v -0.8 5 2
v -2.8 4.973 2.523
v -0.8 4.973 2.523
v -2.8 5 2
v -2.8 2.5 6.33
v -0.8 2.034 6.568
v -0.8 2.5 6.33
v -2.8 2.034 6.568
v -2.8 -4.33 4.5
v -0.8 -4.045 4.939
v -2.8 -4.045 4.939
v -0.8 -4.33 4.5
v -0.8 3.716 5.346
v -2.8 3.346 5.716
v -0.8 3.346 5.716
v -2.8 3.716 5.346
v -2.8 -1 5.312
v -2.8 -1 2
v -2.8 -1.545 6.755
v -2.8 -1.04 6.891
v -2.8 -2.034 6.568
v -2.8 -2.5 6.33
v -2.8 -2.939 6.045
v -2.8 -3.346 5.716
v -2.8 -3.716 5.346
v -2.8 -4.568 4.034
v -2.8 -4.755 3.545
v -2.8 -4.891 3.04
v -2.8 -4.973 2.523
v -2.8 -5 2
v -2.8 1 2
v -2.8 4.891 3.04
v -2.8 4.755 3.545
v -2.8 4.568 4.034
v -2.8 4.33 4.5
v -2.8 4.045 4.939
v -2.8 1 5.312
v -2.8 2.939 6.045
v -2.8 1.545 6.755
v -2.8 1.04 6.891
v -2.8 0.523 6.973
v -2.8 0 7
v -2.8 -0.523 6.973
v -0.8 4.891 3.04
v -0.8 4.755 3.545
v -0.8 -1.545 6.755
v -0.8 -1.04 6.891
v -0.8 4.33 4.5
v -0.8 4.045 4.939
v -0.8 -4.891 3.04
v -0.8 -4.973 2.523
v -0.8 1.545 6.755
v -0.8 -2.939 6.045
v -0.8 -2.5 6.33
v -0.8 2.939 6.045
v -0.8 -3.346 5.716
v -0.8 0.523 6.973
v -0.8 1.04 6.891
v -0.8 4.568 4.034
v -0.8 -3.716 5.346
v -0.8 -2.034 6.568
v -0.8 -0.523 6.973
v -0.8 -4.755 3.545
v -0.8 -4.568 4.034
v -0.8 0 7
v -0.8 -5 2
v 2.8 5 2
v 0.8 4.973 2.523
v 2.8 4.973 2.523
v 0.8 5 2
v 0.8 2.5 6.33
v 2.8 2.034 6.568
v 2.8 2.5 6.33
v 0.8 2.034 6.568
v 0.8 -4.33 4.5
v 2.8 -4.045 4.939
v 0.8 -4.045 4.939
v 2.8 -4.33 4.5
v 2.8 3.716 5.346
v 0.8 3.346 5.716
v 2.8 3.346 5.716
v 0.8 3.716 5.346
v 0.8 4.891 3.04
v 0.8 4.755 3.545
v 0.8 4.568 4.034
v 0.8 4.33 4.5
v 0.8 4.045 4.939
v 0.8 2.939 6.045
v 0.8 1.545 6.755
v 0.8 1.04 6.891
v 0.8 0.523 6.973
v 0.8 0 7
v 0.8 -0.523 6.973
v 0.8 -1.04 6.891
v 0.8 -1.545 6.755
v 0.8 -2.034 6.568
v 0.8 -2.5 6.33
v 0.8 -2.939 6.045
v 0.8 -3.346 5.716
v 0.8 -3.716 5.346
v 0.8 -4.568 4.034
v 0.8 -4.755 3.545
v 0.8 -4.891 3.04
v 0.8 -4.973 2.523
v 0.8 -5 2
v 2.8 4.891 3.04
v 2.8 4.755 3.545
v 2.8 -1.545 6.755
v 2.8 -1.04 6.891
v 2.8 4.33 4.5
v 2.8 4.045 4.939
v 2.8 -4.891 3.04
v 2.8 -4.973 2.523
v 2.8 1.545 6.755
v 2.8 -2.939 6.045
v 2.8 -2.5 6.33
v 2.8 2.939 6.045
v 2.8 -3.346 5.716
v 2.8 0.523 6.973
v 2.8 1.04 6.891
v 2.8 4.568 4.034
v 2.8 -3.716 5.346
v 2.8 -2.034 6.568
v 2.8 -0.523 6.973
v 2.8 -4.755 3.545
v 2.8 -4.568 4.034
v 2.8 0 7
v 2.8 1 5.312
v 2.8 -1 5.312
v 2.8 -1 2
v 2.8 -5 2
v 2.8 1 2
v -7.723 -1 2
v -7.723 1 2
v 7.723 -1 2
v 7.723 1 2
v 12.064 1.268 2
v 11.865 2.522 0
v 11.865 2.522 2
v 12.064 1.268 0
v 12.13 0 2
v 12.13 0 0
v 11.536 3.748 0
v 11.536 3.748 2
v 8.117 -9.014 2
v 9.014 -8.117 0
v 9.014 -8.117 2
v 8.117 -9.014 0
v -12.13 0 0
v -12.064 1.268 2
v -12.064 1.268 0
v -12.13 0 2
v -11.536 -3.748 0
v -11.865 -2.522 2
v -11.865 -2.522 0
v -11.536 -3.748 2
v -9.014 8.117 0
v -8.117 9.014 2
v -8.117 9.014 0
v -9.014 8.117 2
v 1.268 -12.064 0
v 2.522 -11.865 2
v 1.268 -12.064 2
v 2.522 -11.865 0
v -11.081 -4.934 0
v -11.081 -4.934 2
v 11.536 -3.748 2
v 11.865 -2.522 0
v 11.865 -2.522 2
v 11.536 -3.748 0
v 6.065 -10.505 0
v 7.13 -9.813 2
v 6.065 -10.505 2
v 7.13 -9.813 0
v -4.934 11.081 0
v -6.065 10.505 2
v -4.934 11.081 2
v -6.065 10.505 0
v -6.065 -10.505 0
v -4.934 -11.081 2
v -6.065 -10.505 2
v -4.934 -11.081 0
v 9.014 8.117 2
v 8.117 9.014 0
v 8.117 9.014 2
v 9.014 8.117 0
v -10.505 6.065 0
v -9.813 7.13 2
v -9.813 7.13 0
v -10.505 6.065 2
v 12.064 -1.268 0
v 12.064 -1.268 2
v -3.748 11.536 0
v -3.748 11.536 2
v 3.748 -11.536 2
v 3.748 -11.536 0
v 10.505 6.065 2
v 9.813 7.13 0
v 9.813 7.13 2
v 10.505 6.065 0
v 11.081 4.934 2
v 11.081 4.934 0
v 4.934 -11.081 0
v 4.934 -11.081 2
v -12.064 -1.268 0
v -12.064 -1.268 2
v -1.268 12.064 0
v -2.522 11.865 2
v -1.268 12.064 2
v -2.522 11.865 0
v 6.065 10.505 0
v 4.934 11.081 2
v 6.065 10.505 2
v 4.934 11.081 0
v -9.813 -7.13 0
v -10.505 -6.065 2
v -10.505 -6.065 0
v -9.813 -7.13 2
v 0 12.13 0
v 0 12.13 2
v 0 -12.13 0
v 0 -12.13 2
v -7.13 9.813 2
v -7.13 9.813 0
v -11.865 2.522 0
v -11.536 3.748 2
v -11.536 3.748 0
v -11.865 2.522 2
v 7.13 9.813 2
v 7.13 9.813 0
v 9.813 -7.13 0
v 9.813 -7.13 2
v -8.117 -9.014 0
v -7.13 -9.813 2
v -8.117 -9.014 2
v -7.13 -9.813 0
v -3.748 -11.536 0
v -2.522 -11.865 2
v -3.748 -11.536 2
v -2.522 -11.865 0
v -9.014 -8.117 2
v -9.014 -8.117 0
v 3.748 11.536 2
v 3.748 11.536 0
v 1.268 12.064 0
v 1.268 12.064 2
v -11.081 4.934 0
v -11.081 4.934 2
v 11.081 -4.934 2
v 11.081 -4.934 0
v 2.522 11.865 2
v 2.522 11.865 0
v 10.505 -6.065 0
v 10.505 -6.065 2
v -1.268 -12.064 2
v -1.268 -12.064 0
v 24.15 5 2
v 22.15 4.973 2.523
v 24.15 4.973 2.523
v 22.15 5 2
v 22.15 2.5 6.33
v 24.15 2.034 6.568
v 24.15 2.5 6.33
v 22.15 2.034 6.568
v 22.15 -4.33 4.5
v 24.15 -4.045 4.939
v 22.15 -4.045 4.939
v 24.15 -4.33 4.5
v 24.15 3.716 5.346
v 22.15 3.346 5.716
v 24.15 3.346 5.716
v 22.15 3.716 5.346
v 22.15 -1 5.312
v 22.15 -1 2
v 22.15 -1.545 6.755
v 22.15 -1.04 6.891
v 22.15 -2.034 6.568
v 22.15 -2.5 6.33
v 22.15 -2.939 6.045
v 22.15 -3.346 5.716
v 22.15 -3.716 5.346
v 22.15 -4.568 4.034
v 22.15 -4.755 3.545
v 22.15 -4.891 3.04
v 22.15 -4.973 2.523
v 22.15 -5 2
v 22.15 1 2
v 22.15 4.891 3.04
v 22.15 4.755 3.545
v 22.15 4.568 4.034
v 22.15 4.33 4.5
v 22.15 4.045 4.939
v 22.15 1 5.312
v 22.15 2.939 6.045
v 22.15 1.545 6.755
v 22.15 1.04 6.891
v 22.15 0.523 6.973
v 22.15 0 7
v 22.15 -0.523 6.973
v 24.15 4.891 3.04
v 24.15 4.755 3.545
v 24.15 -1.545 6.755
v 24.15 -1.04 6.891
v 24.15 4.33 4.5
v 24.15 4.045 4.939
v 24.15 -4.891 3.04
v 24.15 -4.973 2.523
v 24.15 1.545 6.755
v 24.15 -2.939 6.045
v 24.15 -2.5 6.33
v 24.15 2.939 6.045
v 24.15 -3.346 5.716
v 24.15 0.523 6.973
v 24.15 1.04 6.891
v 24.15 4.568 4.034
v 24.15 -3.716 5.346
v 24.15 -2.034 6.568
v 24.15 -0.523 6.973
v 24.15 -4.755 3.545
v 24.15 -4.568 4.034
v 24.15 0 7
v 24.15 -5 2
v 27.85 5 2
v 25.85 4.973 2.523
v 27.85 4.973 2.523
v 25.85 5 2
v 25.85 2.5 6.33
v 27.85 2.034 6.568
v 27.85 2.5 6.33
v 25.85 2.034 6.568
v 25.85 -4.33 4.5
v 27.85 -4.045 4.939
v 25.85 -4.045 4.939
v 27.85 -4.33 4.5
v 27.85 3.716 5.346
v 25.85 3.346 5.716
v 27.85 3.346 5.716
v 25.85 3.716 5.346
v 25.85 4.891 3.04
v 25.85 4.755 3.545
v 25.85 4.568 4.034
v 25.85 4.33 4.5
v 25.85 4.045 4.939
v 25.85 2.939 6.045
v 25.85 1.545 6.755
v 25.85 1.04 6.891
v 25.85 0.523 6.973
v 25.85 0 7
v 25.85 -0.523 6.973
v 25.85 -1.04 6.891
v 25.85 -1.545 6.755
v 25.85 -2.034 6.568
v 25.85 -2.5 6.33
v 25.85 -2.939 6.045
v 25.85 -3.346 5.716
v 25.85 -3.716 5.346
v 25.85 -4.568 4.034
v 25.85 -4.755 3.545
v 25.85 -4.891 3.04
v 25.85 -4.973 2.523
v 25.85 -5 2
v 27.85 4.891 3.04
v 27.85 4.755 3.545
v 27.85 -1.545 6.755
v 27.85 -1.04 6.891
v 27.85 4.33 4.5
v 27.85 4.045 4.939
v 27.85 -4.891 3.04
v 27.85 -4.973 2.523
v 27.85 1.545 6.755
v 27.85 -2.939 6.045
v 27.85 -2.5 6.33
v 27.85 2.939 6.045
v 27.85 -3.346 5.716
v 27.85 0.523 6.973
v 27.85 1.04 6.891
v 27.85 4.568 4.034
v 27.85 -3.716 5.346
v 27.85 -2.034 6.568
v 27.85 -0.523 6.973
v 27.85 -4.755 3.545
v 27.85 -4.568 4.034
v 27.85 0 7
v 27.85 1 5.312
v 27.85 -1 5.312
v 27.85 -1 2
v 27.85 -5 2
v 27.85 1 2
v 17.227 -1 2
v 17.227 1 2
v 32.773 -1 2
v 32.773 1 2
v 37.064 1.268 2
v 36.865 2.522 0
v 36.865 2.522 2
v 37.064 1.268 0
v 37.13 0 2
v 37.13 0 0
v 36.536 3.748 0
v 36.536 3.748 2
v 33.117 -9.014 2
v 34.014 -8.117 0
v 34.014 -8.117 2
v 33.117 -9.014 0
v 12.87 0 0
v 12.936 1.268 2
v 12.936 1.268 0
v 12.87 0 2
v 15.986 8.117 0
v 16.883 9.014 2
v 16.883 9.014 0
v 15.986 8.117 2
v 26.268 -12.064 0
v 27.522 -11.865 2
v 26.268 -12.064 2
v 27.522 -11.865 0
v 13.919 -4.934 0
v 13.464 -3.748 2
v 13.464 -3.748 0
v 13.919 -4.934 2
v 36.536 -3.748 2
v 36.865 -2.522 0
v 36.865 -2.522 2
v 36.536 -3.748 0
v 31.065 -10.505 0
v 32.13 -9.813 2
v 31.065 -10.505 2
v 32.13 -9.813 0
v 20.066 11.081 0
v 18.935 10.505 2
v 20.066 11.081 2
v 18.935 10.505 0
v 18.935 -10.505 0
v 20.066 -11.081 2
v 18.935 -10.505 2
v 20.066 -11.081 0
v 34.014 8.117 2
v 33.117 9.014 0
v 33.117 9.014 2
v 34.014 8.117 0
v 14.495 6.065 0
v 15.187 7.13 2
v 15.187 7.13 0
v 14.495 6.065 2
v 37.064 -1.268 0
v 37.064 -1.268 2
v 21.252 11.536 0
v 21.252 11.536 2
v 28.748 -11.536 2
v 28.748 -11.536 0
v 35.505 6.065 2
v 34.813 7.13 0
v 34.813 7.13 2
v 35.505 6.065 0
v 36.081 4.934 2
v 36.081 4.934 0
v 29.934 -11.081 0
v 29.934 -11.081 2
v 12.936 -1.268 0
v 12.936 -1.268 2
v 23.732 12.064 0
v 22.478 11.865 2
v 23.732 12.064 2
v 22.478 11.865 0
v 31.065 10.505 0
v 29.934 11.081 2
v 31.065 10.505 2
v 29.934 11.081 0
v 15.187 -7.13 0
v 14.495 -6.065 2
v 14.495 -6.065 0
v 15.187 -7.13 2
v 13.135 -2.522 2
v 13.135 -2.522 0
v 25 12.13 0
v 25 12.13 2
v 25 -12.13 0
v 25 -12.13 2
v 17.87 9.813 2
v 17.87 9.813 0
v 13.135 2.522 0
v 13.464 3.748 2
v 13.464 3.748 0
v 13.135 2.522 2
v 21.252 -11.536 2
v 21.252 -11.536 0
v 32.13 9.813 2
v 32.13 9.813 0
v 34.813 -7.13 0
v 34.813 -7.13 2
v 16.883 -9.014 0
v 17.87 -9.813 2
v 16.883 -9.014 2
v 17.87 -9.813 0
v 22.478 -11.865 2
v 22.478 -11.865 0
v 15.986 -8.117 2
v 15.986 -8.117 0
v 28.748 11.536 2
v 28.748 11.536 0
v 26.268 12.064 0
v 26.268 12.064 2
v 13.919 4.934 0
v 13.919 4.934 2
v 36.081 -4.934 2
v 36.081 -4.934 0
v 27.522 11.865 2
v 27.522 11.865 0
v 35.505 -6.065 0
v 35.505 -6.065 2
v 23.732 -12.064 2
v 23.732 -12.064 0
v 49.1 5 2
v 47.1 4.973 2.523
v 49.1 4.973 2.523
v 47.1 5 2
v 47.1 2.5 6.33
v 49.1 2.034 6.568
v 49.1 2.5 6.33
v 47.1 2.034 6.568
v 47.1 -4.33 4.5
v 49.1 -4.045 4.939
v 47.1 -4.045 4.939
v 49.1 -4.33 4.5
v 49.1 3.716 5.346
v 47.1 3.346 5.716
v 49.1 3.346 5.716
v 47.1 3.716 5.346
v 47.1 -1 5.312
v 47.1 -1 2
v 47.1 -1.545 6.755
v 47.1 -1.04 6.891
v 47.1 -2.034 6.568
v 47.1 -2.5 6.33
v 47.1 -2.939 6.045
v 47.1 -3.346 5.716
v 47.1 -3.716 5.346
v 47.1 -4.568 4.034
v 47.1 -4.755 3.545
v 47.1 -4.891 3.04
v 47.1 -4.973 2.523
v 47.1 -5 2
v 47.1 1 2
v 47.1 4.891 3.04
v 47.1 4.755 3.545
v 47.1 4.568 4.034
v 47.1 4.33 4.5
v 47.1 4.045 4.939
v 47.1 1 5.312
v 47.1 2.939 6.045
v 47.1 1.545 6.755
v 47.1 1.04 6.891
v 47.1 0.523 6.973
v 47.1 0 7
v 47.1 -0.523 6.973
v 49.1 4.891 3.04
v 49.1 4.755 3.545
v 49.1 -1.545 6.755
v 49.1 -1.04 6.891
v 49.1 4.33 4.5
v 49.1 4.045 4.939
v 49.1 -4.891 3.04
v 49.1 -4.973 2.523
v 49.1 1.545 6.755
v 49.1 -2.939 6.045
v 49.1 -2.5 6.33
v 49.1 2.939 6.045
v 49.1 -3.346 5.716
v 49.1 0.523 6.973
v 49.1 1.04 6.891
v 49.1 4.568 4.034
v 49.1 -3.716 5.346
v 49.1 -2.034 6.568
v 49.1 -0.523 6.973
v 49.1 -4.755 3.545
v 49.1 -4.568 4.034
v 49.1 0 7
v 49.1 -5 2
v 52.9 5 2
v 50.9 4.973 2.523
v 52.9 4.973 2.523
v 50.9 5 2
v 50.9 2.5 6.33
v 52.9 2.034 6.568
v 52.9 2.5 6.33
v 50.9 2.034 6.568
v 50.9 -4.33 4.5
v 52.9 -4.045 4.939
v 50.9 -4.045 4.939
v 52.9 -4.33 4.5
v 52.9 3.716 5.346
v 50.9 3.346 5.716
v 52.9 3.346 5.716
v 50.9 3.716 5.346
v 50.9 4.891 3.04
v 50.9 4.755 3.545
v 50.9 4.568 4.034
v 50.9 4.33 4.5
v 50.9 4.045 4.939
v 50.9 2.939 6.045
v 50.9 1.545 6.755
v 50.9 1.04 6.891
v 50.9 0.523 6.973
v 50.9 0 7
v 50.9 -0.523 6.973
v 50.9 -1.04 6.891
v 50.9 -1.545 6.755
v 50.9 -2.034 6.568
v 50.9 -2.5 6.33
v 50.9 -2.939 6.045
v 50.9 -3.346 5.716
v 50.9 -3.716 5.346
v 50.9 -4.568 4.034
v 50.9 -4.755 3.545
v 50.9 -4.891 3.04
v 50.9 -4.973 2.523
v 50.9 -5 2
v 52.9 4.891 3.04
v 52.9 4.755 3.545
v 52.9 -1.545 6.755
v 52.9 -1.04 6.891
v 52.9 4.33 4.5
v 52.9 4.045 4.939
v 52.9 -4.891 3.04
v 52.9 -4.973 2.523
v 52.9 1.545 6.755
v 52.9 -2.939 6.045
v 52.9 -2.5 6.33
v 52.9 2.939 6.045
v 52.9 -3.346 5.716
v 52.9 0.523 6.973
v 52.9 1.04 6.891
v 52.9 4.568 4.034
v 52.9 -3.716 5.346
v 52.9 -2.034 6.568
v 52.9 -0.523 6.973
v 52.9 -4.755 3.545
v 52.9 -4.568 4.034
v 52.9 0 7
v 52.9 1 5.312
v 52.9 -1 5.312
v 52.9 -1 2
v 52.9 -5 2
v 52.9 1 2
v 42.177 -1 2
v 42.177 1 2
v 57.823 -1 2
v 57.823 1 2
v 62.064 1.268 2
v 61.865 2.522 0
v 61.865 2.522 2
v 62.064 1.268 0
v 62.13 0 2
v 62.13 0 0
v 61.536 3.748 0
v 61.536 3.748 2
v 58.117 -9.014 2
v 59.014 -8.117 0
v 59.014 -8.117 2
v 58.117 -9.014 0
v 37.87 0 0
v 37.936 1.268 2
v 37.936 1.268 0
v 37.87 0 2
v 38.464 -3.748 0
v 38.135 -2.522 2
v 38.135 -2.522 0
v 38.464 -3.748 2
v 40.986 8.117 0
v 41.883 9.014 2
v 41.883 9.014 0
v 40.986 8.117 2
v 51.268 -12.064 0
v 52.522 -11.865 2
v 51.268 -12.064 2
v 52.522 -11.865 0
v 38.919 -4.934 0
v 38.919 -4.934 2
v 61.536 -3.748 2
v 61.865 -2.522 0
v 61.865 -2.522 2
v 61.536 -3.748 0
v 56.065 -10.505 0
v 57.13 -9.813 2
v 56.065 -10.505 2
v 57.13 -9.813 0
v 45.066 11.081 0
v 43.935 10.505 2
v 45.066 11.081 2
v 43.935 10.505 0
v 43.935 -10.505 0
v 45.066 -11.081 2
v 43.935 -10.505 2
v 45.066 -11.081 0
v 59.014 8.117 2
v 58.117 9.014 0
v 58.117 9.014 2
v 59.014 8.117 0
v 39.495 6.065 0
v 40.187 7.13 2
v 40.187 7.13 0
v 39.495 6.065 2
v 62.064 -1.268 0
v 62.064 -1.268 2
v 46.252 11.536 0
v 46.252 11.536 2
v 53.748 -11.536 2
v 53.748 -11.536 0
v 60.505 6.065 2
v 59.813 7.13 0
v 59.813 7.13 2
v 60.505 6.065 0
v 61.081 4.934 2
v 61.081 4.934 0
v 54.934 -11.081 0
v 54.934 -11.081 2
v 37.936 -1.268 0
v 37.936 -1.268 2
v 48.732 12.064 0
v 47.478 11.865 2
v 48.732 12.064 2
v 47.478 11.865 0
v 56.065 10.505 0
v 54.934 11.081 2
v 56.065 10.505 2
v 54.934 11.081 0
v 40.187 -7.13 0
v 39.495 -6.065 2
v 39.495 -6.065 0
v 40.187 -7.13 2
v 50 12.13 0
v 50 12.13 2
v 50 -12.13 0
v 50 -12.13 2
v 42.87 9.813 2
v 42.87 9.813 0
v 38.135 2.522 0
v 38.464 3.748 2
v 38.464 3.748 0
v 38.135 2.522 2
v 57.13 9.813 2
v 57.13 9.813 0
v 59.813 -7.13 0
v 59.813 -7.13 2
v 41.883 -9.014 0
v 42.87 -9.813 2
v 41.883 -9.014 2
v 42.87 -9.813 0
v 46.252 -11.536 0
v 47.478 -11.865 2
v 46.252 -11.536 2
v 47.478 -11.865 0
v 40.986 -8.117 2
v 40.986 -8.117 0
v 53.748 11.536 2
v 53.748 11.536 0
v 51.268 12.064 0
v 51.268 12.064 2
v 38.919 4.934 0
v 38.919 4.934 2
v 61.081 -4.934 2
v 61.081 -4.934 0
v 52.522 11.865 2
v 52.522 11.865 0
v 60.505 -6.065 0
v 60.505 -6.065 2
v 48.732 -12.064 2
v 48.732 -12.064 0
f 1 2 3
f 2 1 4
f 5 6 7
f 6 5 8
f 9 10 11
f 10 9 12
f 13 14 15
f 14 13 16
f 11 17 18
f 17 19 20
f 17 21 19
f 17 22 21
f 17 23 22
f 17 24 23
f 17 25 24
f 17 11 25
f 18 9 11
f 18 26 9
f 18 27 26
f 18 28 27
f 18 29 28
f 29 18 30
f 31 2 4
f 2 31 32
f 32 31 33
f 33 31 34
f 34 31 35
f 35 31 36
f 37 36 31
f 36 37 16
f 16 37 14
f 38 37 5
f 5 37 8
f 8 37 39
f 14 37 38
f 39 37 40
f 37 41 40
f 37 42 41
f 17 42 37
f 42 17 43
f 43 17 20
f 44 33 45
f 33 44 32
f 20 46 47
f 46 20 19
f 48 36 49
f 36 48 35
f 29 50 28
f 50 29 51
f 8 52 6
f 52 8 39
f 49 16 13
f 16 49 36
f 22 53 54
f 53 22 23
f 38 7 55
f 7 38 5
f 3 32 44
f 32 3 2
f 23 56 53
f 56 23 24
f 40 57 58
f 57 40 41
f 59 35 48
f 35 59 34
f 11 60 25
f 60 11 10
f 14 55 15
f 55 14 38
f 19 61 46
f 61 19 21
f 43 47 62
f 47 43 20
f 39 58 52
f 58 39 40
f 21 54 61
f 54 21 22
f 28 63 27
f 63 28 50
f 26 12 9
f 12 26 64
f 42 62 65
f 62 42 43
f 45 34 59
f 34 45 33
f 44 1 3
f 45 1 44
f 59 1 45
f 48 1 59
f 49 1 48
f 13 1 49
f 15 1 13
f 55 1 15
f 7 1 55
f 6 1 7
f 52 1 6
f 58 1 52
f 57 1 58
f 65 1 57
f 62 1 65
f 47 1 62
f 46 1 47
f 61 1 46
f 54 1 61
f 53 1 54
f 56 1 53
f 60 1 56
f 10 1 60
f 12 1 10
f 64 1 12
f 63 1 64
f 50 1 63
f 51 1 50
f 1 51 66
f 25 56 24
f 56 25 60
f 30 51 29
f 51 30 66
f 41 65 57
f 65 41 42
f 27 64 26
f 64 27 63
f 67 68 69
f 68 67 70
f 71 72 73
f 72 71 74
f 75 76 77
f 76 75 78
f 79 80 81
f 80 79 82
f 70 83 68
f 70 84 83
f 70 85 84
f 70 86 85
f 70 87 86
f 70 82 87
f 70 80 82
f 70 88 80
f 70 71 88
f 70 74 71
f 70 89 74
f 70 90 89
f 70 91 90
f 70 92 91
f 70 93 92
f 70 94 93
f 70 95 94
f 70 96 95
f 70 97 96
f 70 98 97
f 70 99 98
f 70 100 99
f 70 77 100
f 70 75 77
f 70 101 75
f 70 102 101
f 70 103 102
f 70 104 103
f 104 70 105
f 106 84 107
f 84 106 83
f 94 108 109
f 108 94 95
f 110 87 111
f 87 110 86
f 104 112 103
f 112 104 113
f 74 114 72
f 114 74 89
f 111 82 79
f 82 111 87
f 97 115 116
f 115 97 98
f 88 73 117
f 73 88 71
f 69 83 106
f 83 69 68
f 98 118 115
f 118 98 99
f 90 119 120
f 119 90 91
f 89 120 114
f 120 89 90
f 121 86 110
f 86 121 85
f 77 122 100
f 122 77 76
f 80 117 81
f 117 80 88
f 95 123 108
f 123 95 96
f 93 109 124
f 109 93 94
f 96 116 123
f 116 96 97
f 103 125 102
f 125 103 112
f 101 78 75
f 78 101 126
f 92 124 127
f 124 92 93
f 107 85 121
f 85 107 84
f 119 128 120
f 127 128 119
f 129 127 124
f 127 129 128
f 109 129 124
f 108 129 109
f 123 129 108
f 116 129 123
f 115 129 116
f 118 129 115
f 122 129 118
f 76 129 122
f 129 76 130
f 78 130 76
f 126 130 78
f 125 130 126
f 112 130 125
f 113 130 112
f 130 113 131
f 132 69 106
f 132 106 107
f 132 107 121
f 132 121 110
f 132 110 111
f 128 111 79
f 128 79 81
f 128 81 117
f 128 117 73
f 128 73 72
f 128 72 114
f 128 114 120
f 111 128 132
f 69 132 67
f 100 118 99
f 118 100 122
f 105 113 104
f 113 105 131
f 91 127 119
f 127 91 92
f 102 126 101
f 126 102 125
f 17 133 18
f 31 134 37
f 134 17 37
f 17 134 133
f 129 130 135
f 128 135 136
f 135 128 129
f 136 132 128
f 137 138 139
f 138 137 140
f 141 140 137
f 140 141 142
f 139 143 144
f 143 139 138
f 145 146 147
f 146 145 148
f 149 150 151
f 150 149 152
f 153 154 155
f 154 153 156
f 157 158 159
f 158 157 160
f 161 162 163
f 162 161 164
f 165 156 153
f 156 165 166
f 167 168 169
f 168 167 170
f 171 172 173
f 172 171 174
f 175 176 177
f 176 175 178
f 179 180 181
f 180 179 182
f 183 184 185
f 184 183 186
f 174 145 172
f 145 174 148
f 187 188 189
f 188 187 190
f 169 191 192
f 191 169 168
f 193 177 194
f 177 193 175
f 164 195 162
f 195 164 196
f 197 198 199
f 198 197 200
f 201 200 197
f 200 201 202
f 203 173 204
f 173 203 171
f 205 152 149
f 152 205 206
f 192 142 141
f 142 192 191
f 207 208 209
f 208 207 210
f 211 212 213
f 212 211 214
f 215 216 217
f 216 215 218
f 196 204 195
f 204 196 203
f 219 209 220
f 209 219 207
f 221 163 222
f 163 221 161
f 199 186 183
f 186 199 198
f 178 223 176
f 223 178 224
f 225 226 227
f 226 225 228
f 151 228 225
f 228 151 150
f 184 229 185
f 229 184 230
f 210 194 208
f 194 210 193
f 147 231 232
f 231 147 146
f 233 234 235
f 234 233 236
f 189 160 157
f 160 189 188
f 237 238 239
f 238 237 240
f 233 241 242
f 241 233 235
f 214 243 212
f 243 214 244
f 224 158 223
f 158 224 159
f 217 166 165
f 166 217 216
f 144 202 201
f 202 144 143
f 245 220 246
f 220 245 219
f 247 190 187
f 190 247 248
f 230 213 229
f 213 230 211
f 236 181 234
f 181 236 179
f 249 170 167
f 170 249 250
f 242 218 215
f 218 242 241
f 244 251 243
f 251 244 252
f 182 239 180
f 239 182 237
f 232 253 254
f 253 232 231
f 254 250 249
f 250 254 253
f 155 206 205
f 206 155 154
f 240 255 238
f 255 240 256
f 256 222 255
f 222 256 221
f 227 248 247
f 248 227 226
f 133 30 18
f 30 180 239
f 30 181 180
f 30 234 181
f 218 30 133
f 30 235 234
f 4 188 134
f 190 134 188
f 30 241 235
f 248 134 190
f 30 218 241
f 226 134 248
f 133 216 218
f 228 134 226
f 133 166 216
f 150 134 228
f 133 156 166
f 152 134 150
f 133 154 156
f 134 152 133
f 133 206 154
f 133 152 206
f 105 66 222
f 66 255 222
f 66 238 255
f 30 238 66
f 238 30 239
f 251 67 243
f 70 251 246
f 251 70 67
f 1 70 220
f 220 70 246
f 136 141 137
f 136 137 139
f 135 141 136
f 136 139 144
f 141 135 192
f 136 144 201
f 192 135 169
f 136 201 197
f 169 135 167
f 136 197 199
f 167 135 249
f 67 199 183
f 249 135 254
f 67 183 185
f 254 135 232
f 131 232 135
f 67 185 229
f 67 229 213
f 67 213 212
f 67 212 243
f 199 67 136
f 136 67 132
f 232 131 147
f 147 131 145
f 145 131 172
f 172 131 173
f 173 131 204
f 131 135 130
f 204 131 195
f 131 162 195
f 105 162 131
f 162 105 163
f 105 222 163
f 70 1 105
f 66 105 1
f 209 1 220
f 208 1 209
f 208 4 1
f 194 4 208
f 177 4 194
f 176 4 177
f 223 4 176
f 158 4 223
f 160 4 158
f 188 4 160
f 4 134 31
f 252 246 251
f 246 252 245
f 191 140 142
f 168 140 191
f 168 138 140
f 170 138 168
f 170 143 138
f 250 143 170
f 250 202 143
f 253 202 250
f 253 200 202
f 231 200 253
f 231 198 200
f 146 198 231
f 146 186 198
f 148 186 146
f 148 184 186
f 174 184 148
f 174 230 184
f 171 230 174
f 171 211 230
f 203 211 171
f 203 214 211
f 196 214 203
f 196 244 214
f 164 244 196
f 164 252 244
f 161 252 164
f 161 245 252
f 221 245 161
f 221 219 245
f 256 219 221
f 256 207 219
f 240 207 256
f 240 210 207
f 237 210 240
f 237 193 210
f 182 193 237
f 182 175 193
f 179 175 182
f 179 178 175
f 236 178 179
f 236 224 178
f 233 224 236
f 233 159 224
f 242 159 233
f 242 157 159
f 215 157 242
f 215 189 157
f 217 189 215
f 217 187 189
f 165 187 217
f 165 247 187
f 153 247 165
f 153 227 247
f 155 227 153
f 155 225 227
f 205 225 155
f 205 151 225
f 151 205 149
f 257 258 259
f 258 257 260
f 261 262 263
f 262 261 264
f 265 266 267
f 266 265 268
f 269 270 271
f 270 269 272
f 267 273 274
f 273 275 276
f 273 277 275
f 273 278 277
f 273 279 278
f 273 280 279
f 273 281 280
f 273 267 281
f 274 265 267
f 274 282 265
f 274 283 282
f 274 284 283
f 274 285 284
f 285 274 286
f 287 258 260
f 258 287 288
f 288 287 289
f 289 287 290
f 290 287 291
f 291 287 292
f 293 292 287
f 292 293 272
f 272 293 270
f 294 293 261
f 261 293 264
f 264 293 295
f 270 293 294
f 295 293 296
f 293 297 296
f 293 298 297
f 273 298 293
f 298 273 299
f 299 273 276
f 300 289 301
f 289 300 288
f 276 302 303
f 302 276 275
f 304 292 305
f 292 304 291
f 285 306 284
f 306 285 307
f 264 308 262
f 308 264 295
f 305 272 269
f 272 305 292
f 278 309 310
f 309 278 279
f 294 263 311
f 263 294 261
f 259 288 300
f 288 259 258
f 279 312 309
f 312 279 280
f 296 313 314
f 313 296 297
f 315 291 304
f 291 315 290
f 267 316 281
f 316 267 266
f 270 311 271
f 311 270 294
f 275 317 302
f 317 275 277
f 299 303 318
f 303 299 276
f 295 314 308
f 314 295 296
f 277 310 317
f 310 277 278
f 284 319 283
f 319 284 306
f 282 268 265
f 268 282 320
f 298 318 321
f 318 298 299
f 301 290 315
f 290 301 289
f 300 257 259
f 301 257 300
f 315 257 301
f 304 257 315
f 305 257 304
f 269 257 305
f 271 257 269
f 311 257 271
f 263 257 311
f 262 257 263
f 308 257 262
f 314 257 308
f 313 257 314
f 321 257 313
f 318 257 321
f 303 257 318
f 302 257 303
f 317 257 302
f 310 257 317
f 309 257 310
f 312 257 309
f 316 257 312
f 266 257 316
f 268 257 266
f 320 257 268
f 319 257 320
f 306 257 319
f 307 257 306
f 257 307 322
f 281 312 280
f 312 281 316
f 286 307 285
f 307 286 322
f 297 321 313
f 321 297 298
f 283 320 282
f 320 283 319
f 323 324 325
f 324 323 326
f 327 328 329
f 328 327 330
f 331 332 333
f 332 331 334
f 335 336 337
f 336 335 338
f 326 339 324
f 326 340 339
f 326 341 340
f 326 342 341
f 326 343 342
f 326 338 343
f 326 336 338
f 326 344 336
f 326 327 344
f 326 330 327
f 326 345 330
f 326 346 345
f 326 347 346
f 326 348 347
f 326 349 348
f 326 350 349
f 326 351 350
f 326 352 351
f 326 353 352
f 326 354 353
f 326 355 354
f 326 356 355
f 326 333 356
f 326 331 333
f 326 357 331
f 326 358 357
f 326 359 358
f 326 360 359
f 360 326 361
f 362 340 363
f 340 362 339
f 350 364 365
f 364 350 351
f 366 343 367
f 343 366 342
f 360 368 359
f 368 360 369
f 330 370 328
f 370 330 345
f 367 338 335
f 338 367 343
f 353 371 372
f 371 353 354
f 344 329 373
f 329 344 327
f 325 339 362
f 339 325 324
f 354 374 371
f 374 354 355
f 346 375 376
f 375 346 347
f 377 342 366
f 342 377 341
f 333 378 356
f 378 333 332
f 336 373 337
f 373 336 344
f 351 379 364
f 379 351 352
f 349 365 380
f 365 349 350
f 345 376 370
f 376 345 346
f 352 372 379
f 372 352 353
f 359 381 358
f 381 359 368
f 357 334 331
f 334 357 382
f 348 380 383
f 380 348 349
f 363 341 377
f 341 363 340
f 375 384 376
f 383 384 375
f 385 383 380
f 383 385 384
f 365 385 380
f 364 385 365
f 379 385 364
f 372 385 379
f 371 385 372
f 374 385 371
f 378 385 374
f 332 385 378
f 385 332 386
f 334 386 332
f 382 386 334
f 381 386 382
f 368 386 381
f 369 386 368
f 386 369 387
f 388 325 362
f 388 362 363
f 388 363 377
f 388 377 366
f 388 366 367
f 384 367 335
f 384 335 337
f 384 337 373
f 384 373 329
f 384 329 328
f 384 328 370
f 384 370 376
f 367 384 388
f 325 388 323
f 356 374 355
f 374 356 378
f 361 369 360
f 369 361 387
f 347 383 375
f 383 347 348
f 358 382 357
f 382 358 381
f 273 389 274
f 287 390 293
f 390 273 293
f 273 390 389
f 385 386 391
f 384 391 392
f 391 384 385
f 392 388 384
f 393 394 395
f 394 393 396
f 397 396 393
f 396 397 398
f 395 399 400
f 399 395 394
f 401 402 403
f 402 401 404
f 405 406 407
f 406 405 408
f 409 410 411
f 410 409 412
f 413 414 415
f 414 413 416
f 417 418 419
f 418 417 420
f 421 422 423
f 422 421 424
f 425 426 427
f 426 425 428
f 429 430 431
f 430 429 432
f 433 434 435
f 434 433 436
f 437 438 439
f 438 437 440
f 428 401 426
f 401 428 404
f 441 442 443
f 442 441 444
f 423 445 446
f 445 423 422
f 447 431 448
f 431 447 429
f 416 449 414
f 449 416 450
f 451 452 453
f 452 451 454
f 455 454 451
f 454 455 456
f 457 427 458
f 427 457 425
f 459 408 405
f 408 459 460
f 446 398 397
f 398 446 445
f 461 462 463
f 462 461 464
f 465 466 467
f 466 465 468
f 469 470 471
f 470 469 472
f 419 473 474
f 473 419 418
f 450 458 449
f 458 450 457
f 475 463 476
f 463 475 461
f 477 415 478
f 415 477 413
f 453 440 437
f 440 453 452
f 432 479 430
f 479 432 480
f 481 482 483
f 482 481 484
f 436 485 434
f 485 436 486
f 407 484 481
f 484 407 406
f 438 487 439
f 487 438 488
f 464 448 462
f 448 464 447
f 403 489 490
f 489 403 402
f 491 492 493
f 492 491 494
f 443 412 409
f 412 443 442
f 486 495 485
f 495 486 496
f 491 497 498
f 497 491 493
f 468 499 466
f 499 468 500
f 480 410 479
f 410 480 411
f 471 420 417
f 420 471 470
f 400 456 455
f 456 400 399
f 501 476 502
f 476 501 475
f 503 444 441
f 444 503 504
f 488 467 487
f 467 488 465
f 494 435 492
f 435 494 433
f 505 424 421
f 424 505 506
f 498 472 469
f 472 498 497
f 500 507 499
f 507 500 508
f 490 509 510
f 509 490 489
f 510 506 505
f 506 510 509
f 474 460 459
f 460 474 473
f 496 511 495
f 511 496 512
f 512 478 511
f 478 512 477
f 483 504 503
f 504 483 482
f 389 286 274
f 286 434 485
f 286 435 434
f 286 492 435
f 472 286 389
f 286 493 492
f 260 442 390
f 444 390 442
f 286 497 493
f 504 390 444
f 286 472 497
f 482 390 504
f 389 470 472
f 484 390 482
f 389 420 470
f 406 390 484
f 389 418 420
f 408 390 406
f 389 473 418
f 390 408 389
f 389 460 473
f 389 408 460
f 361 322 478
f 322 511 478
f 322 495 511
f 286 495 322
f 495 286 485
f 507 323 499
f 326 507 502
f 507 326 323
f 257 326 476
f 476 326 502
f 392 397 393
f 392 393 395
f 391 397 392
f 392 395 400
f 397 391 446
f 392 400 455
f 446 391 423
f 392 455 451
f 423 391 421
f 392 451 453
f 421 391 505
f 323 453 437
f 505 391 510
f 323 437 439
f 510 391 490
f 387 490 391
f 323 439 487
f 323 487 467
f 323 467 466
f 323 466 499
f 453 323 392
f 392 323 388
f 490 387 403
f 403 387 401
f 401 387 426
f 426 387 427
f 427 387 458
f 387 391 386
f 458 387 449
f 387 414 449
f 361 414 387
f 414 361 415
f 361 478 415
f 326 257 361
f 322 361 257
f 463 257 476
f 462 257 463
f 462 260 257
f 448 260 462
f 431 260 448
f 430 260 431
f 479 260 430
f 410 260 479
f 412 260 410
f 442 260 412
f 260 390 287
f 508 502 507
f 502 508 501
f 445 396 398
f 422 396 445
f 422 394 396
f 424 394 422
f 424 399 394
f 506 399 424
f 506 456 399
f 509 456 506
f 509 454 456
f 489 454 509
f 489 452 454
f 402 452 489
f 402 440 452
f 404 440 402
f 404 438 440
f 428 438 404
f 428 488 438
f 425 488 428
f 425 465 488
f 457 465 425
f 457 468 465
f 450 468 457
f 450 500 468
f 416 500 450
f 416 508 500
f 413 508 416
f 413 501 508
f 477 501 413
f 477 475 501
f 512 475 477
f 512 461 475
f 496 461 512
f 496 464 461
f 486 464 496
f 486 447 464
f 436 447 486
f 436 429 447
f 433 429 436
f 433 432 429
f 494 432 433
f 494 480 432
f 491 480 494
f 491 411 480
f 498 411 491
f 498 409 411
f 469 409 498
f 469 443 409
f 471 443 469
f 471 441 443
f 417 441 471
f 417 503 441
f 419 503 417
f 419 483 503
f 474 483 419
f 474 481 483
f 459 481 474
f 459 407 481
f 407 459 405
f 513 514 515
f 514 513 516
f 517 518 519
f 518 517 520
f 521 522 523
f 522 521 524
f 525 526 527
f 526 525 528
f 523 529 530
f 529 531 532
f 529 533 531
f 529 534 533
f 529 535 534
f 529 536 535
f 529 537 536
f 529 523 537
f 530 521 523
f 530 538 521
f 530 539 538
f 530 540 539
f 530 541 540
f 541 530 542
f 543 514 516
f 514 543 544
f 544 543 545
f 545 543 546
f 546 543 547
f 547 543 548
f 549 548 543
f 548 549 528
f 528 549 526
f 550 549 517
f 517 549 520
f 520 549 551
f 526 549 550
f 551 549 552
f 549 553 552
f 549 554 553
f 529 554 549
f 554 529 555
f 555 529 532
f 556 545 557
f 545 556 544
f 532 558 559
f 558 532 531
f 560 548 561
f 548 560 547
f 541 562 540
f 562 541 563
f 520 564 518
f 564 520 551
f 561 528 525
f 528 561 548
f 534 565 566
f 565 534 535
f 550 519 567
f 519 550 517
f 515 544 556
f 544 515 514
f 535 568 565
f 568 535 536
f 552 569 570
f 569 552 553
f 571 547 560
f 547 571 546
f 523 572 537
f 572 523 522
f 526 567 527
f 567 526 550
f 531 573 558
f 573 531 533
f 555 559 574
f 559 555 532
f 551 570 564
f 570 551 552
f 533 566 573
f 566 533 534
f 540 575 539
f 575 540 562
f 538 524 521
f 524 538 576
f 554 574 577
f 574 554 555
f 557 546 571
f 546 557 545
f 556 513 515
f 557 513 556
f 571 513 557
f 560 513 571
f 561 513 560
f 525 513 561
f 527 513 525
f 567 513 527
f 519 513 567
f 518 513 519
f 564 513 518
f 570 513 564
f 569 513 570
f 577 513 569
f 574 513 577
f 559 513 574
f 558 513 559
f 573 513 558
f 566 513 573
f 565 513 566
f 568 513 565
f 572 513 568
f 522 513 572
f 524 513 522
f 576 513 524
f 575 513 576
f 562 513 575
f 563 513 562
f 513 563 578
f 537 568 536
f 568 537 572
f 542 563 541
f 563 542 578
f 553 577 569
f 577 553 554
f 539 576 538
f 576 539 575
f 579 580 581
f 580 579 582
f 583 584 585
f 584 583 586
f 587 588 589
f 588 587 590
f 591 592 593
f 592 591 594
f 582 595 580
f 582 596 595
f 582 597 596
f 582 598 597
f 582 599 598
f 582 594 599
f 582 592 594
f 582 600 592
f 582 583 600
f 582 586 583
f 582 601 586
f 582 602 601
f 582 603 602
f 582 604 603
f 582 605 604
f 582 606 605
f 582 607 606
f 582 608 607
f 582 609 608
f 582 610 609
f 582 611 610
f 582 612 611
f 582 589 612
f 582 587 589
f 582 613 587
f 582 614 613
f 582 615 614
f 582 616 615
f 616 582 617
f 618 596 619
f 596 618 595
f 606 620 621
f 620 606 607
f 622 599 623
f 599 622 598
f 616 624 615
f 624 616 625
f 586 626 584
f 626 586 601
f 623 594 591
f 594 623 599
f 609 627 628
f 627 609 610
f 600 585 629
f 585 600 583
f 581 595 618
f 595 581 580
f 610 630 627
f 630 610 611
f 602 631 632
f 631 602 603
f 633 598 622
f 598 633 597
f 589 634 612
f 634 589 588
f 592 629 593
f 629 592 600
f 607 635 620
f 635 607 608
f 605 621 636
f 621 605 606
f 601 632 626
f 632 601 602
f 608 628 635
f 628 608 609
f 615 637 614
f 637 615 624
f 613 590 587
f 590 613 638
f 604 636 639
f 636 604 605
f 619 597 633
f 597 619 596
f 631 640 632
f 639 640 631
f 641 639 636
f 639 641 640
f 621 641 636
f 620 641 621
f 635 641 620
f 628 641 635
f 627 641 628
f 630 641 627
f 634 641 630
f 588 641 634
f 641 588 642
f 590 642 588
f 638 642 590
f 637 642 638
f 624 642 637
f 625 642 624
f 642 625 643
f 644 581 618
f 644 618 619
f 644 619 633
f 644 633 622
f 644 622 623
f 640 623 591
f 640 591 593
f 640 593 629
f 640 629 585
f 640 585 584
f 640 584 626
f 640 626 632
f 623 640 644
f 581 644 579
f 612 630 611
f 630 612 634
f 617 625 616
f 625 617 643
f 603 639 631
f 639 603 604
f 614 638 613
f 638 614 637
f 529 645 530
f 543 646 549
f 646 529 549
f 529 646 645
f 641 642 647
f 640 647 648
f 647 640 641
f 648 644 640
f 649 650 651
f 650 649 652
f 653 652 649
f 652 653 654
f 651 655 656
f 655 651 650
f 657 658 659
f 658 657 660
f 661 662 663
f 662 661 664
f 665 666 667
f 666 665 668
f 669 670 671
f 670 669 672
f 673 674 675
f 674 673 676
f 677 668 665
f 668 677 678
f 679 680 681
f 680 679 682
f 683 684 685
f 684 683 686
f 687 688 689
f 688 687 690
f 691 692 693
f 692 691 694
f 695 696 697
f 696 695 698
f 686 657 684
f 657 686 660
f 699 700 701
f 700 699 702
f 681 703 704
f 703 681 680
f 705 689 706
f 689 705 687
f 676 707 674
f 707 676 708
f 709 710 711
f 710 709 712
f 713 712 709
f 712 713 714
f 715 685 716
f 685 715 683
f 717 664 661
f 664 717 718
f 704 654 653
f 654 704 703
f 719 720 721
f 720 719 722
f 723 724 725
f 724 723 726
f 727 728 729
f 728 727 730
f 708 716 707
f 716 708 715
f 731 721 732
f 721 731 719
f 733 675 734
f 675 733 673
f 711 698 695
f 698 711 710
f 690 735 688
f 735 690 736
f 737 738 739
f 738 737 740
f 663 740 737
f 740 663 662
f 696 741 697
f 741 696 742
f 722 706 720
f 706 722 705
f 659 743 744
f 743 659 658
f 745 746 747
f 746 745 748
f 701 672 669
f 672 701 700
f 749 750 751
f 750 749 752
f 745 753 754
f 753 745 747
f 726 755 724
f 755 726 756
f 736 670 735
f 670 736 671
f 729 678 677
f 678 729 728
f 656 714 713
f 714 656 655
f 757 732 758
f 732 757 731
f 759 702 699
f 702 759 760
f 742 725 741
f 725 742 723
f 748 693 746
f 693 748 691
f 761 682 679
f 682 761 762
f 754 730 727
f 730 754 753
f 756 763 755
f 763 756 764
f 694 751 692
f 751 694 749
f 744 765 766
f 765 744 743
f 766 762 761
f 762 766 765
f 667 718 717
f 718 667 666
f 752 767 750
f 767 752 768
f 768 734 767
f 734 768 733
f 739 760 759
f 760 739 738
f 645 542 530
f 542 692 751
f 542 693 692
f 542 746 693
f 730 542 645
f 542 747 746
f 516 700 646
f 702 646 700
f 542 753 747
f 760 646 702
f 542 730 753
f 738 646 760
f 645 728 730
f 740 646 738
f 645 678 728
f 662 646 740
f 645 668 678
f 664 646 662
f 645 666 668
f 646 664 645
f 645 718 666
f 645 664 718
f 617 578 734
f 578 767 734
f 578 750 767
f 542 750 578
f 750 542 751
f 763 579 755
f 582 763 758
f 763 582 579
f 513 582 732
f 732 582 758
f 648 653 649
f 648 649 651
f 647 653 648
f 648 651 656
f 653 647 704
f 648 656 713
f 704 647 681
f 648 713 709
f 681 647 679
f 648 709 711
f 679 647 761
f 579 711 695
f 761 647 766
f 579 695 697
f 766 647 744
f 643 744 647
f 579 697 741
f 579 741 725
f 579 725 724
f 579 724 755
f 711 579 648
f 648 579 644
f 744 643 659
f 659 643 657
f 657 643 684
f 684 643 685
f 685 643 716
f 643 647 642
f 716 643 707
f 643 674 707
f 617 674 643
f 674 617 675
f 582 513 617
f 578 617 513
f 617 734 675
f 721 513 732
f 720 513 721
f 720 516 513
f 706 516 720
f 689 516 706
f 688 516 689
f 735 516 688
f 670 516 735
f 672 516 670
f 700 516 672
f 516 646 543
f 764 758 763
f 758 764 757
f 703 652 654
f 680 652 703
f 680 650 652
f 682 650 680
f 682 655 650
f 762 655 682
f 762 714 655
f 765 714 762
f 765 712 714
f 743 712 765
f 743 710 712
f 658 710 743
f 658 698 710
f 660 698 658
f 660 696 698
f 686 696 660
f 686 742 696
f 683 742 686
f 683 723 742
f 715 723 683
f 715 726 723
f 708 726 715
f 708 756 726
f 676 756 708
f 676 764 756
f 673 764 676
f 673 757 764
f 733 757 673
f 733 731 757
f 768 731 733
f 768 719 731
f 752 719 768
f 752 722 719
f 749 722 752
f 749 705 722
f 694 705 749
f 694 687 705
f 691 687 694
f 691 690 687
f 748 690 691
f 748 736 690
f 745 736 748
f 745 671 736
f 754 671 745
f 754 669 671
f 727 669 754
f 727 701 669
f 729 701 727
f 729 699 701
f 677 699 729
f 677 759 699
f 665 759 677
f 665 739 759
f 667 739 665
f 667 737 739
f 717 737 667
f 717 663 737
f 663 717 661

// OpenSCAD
// file: flat_top_rectangular_pyramid.scad
module flat_top_rectangular_pyramid(
    top_width = 0,
    top_length = 0,

    bottom_width = 0,
    bottom_length = 0,

    height = 0,

    top_x = undef,
    top_y = undef,

    top_weight_x = .5,
    top_weight_y = .5
) {
    top_x = top_x != undef
        ? top_x
        : (bottom_width - top_width) * top_weight_x;
    top_y = top_y != undef
        ? top_y
        : (bottom_length - top_length) * top_weight_y;

    max_difference = max(bottom_width - top_width, bottom_length - top_length);
    height = height == undef
        ? max_difference / 2
        : height;

    polyhedron(
        [
            [0, 0, 0],
            [bottom_width, 0, 0],
            [bottom_width, bottom_length, 0],
            [0, bottom_length, 0],
            [top_x, top_y, height],
            [top_width + top_x, top_y, height],
            [top_width + top_x, top_length + top_y, height],
            [top_x, top_length + top_y, height]
        ], [
            [0, 1, 2, 3],
            [4, 5, 1, 0],
            [7, 6, 5, 4],
            [5, 6, 2, 1],
            [6, 7, 3, 2],
            [7, 4, 0, 3]
        ]
    );
}
// main file
include <flat_top_rectangular_pyramid.scad>;

US_QUARTER_DIAMETER = 24.26;

module card_stand(
    grip_diameter = 10,
    grip_gap = 1.6,
    grip_wall = 2,

    base_diameter = US_QUARTER_DIAMETER,
    base_height = 2,

    tolerance = 0,

    $fn = 60
) {
    e = .031;

    module _base() {
        cylinder(
            d = base_diameter,
            h = base_height
        );
    }

    module _grip() {
        intersection() {
            for (x = [
                -grip_wall - grip_gap / 2 - tolerance,
                grip_gap / 2 + tolerance
            ]) {
                translate([x, 0, base_height]) {
                    rotate([0, 90, 0]) {
                        cylinder(
                            d = grip_diameter,
                            h = grip_wall
                        );
                    }
                }
            }

            translate([0, 0, base_height - e]) {
                cylinder(
                    d = base_diameter,
                    h = grip_diameter / 2 + e
                );
            }
        }
    }

    module _braces() {
        width = grip_diameter / 2;
        height = width * (2/3);

        xs = [
            -width - grip_gap / 2 - grip_wall - tolerance + e,
            grip_gap / 2 + grip_wall + tolerance - e
        ];

        for (i = [0, 1]) {
            translate([xs[i], grip_wall / -2, base_height - e]) {
                flat_top_rectangular_pyramid(
                    top_width = 0,
                    top_length = grip_wall,

                    bottom_width = width,
                    bottom_length = grip_wall,

                    height = height + e,

                    top_weight_x = i == 0 ? 1 : 0
                );
            }
        }
    }

    _base();
   _grip();
   _braces();
}

translate([25 * 0, 0, 0]) card_stand(tolerance = 0);
translate([25 * 1, 0, 0]) card_stand(tolerance = .05);
translate([25 * 2, 0, 0]) card_stand(tolerance = .1);
